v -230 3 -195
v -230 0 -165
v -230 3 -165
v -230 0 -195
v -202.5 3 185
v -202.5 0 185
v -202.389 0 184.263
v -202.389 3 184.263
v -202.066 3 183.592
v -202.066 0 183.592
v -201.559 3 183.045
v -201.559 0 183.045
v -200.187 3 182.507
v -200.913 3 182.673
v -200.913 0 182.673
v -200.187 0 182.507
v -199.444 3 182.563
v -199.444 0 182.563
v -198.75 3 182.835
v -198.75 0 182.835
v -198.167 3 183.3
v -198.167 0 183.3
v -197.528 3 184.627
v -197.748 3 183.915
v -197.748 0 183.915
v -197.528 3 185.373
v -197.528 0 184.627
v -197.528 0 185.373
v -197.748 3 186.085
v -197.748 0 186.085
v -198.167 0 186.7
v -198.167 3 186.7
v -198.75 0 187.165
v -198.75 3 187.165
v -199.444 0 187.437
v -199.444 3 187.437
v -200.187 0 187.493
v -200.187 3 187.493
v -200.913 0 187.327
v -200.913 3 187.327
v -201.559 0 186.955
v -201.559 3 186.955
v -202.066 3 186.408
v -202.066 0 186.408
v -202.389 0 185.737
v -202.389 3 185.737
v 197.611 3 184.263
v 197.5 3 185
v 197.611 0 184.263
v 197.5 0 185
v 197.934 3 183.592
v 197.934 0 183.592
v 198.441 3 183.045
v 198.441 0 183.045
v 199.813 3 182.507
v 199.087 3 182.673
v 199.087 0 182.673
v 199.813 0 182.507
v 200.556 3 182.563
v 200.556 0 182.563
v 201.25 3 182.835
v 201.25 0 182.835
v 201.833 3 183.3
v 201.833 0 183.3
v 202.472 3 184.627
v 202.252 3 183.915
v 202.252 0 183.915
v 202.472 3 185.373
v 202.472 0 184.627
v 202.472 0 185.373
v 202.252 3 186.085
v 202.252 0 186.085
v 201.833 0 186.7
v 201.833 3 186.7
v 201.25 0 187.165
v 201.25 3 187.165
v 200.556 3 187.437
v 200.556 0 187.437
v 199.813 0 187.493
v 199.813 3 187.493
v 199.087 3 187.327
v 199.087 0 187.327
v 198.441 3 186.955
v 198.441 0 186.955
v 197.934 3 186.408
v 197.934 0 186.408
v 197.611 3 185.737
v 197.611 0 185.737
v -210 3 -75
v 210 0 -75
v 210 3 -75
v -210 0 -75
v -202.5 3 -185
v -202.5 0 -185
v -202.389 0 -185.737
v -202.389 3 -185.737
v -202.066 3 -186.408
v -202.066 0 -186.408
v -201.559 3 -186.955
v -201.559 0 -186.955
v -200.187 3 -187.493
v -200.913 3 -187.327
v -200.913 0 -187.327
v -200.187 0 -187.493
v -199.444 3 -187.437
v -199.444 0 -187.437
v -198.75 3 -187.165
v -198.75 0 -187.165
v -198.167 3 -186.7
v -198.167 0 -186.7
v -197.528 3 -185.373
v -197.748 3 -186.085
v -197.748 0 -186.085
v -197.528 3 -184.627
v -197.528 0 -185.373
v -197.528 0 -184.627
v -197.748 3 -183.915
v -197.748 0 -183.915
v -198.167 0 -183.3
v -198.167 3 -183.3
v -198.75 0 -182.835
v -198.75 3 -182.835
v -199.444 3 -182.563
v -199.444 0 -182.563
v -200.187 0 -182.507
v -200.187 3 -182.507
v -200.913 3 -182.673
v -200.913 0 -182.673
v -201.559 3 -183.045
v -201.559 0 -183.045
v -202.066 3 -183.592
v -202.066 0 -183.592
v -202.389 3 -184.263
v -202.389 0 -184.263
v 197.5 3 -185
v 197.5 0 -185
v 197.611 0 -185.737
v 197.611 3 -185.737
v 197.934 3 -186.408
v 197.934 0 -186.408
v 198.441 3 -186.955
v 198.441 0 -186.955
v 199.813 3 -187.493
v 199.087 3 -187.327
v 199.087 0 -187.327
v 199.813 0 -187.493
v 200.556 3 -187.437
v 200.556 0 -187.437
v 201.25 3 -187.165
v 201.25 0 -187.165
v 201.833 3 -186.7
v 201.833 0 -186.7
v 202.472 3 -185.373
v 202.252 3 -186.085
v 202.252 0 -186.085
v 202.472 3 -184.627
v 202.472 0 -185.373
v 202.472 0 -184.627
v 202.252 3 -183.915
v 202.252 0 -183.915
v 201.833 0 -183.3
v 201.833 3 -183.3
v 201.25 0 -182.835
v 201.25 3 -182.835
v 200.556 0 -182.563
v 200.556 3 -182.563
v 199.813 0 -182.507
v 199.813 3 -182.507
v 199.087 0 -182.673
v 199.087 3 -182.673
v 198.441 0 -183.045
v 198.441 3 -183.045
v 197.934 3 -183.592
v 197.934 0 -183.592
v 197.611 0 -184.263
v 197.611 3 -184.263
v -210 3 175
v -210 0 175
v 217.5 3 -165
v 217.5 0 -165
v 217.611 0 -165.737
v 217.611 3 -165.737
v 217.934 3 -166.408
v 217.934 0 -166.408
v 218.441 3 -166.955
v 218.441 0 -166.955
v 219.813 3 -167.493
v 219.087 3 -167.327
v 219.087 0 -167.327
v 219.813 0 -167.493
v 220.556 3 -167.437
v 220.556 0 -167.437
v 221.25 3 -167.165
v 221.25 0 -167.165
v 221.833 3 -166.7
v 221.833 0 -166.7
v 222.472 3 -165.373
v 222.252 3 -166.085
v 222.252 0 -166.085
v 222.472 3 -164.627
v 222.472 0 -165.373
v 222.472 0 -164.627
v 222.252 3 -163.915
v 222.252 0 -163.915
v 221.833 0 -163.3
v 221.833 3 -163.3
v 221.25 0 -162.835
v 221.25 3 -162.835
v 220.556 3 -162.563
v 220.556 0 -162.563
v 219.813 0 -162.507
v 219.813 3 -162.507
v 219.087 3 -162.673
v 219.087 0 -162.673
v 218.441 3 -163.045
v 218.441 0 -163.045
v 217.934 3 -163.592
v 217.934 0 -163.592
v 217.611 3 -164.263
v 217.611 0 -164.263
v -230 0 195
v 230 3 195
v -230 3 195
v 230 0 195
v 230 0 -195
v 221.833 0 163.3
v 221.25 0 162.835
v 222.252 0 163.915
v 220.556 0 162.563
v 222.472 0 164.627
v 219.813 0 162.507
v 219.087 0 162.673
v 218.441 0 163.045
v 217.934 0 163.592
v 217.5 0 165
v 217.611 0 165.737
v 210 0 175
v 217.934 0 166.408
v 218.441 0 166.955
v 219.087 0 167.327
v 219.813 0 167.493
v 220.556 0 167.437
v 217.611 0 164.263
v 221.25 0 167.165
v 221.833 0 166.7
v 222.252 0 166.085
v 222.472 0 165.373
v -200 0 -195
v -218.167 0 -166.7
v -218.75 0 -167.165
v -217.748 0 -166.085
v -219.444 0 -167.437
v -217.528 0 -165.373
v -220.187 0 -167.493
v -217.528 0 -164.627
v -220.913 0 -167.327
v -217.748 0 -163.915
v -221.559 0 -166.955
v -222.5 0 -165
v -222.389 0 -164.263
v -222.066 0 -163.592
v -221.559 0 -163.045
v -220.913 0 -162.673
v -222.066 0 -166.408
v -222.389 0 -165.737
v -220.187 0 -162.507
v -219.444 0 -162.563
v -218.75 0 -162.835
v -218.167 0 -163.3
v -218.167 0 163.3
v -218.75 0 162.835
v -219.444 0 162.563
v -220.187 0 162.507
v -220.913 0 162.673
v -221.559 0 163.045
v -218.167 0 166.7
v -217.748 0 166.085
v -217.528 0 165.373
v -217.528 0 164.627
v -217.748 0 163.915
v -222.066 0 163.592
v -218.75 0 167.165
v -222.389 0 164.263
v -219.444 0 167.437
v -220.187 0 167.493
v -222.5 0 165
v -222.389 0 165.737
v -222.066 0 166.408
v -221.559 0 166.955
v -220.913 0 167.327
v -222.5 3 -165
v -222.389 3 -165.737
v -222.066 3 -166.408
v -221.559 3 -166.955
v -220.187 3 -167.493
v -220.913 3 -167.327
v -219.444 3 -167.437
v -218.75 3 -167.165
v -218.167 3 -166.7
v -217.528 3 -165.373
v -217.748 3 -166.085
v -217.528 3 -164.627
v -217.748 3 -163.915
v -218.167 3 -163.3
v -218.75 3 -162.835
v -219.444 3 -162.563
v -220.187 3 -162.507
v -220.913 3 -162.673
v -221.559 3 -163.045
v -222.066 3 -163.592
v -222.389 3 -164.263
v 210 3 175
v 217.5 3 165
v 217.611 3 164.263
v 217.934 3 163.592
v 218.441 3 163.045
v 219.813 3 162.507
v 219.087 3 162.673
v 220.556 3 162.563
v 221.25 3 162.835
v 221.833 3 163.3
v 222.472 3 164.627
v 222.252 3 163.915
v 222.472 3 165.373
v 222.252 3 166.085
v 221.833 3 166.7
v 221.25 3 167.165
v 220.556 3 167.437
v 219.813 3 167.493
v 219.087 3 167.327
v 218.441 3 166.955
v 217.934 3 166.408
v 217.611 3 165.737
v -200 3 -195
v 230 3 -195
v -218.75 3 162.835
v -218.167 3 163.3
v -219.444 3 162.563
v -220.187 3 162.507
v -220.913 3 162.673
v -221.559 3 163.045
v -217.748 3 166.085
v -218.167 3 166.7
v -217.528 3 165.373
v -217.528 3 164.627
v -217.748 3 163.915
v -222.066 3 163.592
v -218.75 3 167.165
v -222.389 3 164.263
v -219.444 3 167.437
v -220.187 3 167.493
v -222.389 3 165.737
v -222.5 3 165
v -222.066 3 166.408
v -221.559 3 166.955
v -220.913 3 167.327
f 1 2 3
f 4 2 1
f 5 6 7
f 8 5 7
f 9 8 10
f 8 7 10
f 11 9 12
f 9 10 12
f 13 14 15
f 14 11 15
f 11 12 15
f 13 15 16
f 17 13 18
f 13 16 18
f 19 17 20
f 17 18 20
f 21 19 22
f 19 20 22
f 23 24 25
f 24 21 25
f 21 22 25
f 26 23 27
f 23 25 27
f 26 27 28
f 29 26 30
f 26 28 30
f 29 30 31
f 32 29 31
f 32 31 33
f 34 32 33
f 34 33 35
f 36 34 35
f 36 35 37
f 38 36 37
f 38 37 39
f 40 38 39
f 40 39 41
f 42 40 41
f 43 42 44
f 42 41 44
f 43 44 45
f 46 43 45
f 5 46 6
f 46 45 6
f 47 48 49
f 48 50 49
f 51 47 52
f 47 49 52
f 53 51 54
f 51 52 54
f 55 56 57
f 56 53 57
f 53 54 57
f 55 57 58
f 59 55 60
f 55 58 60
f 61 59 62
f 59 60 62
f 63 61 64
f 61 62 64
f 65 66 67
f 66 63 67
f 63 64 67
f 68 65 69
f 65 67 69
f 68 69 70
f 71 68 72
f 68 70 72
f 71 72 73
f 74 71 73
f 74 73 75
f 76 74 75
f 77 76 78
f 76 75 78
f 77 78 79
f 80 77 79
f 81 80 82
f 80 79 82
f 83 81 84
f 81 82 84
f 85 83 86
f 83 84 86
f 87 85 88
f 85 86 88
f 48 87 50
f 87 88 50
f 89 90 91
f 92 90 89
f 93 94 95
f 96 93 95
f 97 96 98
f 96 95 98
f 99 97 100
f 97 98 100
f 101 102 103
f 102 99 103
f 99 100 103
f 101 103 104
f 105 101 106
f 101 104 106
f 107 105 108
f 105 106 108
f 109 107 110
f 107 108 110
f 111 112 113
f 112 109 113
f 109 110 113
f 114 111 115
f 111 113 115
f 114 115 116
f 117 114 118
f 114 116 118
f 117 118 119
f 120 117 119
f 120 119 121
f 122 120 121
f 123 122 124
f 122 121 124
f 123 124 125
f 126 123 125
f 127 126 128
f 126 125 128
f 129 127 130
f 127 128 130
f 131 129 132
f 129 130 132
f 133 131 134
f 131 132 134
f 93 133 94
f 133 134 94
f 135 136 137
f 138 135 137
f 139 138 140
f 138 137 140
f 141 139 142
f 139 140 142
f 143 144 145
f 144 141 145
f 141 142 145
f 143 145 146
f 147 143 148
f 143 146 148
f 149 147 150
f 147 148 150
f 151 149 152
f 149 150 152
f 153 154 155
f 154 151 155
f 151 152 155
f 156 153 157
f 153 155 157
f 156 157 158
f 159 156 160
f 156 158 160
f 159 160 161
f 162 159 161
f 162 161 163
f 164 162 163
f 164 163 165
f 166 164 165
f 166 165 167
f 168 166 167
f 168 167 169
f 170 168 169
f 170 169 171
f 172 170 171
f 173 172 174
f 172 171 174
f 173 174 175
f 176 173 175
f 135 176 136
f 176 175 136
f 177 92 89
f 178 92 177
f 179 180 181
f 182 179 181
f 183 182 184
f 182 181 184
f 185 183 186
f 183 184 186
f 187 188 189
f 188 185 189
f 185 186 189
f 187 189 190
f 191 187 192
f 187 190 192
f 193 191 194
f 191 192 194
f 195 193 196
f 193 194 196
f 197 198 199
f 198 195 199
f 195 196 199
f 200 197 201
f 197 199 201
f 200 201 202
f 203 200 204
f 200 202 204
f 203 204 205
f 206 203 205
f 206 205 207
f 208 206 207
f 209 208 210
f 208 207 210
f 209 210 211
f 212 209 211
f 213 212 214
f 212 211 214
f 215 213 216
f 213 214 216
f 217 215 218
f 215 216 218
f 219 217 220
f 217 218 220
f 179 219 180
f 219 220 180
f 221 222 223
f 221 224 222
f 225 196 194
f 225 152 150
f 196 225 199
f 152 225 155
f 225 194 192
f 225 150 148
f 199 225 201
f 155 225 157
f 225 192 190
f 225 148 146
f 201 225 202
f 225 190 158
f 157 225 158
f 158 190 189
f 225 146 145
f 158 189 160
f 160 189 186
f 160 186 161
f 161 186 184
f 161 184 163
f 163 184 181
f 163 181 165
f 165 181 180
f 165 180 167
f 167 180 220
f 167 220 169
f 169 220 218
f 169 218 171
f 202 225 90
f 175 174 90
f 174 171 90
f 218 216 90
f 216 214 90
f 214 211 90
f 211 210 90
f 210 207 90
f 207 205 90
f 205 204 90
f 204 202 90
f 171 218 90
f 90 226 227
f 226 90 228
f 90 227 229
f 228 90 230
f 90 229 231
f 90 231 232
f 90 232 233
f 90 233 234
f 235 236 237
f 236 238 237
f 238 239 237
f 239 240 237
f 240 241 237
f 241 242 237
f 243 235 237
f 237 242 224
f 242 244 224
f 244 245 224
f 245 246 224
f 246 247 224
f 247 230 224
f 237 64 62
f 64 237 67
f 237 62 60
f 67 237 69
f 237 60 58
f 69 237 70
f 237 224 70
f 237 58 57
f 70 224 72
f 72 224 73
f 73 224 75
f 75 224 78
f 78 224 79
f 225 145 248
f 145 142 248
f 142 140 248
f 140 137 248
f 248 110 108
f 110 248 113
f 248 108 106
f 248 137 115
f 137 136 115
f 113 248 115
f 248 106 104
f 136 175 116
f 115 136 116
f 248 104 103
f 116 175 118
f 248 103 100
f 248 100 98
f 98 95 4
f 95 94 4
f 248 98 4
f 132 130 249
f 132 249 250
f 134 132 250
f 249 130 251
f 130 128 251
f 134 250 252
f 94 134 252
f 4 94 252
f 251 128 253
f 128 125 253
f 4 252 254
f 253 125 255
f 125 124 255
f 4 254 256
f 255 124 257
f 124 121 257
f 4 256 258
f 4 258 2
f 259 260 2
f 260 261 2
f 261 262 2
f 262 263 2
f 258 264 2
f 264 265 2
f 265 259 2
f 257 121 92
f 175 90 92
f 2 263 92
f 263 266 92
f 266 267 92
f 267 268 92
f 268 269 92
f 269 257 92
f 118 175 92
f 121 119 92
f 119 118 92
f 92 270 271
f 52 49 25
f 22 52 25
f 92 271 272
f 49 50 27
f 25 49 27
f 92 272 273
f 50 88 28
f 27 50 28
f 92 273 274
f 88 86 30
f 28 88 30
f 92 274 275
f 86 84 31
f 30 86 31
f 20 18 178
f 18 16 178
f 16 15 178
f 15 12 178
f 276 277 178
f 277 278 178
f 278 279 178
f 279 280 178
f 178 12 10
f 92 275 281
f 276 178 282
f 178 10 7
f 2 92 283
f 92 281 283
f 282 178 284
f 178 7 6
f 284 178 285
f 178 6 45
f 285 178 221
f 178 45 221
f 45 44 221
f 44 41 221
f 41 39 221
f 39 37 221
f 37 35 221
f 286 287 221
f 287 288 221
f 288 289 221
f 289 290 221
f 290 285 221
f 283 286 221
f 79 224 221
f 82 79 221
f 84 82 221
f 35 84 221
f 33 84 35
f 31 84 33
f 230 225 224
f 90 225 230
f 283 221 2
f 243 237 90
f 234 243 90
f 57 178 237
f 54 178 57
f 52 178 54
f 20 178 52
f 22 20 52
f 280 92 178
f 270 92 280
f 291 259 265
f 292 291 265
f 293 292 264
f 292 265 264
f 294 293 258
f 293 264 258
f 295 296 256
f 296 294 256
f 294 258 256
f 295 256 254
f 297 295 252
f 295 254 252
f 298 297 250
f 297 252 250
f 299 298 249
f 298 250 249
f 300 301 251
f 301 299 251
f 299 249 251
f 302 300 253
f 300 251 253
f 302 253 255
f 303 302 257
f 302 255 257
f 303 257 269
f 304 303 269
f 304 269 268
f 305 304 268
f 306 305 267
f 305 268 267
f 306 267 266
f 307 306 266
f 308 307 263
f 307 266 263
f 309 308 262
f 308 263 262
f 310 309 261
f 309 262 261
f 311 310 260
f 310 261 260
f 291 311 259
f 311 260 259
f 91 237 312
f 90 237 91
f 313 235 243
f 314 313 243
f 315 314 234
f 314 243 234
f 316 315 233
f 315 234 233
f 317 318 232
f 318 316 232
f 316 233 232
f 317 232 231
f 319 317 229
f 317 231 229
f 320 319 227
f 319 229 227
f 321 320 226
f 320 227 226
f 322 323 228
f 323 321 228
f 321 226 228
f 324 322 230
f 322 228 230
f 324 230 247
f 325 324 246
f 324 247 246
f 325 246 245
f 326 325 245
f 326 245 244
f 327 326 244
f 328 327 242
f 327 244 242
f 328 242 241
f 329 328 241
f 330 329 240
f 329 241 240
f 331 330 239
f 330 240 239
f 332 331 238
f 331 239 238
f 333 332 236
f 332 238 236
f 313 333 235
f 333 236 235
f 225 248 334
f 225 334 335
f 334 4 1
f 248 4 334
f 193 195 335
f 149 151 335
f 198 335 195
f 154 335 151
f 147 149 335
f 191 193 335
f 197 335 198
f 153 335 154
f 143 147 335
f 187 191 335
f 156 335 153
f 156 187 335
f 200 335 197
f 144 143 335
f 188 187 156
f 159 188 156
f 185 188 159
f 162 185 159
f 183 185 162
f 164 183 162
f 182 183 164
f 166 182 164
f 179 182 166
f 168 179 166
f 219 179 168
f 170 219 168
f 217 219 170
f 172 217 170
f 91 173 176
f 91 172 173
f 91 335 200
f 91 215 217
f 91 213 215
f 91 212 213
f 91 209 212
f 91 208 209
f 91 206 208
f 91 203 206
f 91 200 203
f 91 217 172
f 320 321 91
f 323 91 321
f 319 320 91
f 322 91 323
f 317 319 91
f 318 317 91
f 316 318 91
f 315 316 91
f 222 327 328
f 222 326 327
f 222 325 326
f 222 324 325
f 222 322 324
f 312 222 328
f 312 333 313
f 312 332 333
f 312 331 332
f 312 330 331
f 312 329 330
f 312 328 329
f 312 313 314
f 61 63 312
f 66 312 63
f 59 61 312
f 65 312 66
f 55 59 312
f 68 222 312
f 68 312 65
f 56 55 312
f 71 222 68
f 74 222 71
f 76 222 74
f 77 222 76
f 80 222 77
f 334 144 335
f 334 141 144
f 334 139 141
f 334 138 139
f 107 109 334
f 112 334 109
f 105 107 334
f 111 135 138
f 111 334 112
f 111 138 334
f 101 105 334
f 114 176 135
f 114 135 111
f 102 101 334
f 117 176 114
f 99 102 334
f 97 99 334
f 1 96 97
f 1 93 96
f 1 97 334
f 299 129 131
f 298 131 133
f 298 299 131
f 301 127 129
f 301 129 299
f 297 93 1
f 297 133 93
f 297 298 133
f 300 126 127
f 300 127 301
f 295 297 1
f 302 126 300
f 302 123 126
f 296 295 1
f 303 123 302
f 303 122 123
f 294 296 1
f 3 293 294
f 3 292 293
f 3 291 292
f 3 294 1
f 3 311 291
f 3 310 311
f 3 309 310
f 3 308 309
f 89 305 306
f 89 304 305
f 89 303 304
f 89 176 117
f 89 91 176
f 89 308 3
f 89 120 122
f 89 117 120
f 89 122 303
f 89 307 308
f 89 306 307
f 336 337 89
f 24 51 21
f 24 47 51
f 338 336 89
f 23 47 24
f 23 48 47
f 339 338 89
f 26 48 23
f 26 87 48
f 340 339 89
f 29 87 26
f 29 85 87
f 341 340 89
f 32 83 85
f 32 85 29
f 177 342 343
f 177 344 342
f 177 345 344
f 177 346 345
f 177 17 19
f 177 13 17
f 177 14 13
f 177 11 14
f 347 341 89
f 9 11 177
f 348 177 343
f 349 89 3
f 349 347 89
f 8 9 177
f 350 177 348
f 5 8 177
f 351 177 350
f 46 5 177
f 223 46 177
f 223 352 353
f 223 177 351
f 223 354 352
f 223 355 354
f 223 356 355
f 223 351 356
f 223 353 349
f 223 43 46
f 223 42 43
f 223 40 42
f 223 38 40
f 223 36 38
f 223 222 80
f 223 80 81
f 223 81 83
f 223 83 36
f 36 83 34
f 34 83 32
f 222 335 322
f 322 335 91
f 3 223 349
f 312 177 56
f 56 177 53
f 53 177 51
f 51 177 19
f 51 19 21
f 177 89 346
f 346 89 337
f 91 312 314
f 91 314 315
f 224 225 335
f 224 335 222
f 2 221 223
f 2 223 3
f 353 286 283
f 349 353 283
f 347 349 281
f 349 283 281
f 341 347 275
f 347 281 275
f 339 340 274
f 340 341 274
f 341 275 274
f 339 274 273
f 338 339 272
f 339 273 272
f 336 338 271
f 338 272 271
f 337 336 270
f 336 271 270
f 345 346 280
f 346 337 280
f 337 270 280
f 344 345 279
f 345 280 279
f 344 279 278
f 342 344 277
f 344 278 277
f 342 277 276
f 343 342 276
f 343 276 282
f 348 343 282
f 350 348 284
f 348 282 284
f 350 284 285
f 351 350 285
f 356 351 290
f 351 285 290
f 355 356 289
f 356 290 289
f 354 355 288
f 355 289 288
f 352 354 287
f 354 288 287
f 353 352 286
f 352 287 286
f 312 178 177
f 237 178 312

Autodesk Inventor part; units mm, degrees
ref_plane "YZ Plane" through (0, 0, 0) normal (1, 0, 0) x (0, 1, 0)
ref_plane "XZ Plane" through (0, 0, 0) normal (0, 1, 0) x (-1, 0, 0)
ref_plane "XY Plane" through (0, 0, 0) normal (0, 0, 1) x (1, 0, 0)
sketch "Sketch1" plane through (0, 0, 0) normal (0, 1, 0) x (-1, 0, 0)
  line L0 (-230, 195) -> (230, 195)
  line L1 (230, 195) -> (230, -195)
  line L2 (230, -195) -> (-230, -195)
  line L3 (-230, -195) -> (-230, 195)
  line L4 (-230, 195) -> (230, -195) construction
  line L5 (230, 195) -> (-230, -195) construction
  line L6 (210, -75) -> (210, 175)
  line L7 (210, 175) -> (-210, 175)
  line L8 (-210, 175) -> (-210, -75)
  line L9 (230, -195) -> (200, -195)
  line L10 (230, -195) -> (230, -165)
  line L11 (0, 0) -> (0, -25.7255)
  line L12 (0, 0) -> (16.1441, 0)
  circle A0 centre (200, -185) radius 2.5
  circle A1 centre (220, -165) radius 2.5
  circle A2 centre (-200, -185) radius 2.5
  circle A3 centre (-220, -165) radius 2.5
  circle A4 centre (200, 185) radius 2.5
  circle A5 centre (220, 165) radius 2.5
  circle A6 centre (-220, 165) radius 2.5
  circle A7 centre (-200, 185) radius 2.5
  line L13 (-210, 175) -> (-210, -75)
  line L14 (-210, -75) -> (210, -75)
  line L15 (206.4103, -175) -> (210, -175)
  dimension "d0" = 460
  dimension "d1" = 390
  dimension "d6" = 30
  dimension "d10" = 250
extrude "Extrusion1" add sketch "Sketch1" along normal blind 3
properties part number "TapaFrontal"
